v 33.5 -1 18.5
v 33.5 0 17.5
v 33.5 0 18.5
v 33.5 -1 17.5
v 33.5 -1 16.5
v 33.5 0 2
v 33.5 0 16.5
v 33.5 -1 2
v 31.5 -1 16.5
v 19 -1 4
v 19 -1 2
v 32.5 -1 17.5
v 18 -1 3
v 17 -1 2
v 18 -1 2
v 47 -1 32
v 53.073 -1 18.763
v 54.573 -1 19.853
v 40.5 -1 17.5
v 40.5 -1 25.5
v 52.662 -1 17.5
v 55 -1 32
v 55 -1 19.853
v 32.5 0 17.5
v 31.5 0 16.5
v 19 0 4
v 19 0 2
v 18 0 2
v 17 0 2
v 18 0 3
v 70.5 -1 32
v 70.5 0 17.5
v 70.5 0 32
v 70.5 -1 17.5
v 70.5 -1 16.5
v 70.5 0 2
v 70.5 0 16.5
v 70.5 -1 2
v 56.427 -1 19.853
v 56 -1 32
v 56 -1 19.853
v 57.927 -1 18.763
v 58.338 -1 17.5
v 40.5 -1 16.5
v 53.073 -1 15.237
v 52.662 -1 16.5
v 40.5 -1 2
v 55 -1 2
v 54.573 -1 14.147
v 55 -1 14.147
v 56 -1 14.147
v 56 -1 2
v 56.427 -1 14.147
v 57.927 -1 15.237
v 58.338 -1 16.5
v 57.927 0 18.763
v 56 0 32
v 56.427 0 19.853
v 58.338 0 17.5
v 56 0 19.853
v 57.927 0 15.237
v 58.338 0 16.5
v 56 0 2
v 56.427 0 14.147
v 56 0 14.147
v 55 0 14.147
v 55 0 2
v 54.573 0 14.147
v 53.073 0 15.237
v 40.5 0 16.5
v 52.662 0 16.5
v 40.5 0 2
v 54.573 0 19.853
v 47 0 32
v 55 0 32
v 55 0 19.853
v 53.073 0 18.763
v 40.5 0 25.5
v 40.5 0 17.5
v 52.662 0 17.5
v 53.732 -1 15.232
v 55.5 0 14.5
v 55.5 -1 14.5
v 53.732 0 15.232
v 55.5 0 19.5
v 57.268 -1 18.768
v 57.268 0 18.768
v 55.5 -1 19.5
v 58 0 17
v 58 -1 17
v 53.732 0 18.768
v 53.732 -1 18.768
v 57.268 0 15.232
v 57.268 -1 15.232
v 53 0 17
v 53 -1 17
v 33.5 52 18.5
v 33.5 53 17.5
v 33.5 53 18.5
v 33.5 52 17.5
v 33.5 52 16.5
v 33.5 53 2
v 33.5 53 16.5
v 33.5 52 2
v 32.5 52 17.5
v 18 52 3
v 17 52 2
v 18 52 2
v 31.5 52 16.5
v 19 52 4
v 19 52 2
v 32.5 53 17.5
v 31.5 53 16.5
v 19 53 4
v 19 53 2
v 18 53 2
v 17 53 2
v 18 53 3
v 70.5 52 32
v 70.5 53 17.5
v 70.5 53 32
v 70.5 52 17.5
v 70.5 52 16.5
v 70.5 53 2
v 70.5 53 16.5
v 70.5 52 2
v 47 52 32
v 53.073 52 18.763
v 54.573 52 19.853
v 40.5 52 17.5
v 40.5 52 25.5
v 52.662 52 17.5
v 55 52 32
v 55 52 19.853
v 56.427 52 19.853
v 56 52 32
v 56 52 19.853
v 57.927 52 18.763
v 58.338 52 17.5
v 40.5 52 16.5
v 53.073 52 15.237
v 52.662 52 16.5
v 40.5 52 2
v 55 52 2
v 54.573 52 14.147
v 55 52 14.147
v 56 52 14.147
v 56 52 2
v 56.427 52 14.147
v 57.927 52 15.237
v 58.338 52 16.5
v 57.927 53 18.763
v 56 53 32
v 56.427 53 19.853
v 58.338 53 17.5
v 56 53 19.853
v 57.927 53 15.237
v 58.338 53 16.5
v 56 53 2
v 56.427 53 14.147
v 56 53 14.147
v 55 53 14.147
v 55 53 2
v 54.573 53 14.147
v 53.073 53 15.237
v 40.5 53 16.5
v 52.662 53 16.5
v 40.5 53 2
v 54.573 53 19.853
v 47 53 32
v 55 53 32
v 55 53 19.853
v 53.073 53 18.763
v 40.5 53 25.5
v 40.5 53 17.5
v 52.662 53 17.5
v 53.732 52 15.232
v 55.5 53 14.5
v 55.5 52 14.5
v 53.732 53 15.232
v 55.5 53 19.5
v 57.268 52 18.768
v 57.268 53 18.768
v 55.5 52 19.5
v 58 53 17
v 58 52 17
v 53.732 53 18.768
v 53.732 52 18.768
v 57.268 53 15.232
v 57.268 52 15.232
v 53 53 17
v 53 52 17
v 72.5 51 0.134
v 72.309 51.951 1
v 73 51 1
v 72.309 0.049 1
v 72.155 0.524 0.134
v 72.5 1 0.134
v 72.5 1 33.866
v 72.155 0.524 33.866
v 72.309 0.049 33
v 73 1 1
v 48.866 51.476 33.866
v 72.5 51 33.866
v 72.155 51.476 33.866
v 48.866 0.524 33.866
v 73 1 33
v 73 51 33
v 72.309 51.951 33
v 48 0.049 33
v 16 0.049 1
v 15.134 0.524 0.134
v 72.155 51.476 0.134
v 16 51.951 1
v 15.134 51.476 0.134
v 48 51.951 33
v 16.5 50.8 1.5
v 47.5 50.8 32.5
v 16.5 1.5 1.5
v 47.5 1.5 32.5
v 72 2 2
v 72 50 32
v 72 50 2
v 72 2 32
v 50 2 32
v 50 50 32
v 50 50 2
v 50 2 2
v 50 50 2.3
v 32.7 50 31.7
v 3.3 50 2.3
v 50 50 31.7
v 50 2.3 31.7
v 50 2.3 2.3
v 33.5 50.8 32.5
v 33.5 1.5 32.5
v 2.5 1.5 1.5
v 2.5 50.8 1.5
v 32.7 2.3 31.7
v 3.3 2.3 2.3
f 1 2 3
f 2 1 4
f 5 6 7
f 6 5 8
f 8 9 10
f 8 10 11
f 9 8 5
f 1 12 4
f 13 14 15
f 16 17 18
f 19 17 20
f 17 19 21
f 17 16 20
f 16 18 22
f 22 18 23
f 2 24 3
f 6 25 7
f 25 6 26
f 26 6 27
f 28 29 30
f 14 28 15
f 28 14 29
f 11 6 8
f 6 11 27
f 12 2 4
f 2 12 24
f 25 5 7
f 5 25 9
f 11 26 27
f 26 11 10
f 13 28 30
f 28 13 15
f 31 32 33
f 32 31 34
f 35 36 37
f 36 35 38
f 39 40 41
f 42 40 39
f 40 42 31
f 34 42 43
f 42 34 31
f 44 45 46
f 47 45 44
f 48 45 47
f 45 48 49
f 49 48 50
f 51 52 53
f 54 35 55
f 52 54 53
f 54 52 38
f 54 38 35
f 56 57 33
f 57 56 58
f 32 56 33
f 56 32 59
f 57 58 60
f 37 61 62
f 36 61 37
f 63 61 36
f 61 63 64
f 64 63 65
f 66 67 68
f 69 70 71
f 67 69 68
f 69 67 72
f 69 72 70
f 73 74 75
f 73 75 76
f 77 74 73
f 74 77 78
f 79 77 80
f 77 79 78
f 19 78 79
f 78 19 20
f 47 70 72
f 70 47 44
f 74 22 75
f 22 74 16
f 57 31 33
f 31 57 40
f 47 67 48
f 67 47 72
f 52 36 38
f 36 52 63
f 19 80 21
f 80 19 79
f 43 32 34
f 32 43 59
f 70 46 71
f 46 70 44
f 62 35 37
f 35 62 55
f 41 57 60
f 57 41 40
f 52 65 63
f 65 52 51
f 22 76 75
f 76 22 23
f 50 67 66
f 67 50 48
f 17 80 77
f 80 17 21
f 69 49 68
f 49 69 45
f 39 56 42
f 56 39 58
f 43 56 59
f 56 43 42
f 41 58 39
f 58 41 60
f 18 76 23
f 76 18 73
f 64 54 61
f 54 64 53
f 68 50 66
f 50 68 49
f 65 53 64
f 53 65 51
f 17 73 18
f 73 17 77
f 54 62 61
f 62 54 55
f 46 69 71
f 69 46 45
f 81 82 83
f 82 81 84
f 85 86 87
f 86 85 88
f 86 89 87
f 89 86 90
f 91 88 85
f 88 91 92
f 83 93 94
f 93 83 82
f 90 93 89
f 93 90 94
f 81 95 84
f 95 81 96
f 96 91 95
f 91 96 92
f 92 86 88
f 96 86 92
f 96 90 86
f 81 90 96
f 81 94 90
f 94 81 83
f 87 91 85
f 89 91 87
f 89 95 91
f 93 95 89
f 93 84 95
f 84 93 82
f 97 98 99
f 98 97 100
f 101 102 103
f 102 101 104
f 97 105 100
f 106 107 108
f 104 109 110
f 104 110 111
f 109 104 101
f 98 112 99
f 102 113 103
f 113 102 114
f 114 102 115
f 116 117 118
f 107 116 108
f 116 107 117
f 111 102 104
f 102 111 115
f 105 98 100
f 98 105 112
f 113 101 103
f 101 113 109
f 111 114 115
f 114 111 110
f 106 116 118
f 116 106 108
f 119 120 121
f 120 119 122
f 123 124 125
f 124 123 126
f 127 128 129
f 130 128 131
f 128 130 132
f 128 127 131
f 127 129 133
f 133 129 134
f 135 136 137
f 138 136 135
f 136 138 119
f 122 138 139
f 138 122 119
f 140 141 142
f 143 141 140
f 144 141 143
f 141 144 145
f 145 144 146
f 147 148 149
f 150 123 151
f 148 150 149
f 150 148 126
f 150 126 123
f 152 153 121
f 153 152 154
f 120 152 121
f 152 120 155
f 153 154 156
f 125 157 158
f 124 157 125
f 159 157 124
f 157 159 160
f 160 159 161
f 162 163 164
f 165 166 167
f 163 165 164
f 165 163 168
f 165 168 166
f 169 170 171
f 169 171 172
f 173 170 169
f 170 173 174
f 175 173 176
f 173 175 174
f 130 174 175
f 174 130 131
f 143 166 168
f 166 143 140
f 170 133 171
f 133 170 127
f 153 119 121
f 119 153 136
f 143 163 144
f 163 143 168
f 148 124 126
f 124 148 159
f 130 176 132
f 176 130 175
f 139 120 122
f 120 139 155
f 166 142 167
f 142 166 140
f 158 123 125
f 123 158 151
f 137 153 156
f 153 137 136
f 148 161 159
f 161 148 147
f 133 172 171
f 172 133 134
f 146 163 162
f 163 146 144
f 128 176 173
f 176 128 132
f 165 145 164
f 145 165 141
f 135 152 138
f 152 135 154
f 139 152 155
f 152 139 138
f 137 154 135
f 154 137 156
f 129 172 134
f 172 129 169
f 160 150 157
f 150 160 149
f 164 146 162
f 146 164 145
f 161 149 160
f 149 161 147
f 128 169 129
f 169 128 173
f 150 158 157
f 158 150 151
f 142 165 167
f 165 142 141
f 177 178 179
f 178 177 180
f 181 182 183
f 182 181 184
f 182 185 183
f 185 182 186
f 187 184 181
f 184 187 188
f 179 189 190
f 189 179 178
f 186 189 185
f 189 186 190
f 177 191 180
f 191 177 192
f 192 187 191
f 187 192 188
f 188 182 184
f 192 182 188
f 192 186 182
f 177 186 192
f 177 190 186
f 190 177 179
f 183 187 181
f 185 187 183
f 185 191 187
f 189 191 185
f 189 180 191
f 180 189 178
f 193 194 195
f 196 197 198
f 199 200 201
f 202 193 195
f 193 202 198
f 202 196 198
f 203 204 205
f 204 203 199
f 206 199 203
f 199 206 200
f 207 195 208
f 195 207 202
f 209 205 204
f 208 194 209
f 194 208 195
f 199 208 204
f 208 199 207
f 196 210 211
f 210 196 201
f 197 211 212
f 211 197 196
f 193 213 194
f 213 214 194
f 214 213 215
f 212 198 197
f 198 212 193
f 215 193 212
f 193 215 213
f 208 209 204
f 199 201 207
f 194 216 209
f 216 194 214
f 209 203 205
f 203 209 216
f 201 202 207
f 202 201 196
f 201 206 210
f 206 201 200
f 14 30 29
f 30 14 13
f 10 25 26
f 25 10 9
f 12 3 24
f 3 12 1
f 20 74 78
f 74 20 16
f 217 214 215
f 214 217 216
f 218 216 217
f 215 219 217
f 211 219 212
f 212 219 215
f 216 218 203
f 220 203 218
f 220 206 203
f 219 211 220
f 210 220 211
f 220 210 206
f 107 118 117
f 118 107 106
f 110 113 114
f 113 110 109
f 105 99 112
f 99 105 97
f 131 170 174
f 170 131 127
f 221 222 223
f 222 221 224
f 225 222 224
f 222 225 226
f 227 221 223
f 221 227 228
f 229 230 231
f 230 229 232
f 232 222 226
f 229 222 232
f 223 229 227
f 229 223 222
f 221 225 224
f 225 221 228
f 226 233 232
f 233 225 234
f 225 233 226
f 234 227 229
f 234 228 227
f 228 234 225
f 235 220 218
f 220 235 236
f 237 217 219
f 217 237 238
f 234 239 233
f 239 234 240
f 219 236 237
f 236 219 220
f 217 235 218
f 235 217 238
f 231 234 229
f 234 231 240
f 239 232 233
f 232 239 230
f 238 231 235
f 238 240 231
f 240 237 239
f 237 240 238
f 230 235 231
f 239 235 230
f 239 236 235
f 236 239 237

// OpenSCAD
module panel(x,y,z)
{
    translate([x,y,z]) rotate([90,0,0]) {
    difference() {
        cube([30,30,1]);
        translate([0,14.5,0]) cube([30,1,1]);
        translate([14.5,0,0]) cube([1,30,1]);
        translate([15,15,0]) cylinder(h=1,r=3);
    }
    translate([15,15,0]) cylinder(h=1,r=2.5);
    }
}

l=70;
w=48;
h=30;
t=2;
difference() {
    union() {
    hull() {
    translate([1,1,1]) sphere(r=1);
    translate([1,1,h+t+1]) sphere(r=1);
    translate([l+t,1,h+t+1]) sphere(r=1);
    translate([l+t,1,1]) sphere(r=1);
    translate([1,w+t+1,1]) sphere(r=1);
    translate([1,w+t+1,h+t+1]) sphere(r=1);
    translate([l+t,w+t+1,h+t+1]) sphere(r=1);
    translate([l+t,w+t+1,1]) sphere(r=1);
    }
    panel(3.5,0,2);
    panel(40.5,0,2);
    panel(3.5,53,2);
    panel(40.5,53,2);
    }
    translate([0,-1,-15]) rotate([0,-45,0]) cube([2*l,w+2*t+3,l]);
    translate([t,t,t]) cube([l,w,h]);
}
difference() {
    union() {
        translate([0,1.5,1.5]) cube([50,.8,h+1]);
        translate([0,2+w,1.5]) cube([50,.8,h+1]);
        translate([0,2,1.5]) cube([50,w,.8]);
        translate([0,2,1.7+h]) cube([50,w,.8]);
    }
    translate([-9,-1,-10]) rotate([0,-45,0]) cube([2*l,w+2*t+3,l]);
}
